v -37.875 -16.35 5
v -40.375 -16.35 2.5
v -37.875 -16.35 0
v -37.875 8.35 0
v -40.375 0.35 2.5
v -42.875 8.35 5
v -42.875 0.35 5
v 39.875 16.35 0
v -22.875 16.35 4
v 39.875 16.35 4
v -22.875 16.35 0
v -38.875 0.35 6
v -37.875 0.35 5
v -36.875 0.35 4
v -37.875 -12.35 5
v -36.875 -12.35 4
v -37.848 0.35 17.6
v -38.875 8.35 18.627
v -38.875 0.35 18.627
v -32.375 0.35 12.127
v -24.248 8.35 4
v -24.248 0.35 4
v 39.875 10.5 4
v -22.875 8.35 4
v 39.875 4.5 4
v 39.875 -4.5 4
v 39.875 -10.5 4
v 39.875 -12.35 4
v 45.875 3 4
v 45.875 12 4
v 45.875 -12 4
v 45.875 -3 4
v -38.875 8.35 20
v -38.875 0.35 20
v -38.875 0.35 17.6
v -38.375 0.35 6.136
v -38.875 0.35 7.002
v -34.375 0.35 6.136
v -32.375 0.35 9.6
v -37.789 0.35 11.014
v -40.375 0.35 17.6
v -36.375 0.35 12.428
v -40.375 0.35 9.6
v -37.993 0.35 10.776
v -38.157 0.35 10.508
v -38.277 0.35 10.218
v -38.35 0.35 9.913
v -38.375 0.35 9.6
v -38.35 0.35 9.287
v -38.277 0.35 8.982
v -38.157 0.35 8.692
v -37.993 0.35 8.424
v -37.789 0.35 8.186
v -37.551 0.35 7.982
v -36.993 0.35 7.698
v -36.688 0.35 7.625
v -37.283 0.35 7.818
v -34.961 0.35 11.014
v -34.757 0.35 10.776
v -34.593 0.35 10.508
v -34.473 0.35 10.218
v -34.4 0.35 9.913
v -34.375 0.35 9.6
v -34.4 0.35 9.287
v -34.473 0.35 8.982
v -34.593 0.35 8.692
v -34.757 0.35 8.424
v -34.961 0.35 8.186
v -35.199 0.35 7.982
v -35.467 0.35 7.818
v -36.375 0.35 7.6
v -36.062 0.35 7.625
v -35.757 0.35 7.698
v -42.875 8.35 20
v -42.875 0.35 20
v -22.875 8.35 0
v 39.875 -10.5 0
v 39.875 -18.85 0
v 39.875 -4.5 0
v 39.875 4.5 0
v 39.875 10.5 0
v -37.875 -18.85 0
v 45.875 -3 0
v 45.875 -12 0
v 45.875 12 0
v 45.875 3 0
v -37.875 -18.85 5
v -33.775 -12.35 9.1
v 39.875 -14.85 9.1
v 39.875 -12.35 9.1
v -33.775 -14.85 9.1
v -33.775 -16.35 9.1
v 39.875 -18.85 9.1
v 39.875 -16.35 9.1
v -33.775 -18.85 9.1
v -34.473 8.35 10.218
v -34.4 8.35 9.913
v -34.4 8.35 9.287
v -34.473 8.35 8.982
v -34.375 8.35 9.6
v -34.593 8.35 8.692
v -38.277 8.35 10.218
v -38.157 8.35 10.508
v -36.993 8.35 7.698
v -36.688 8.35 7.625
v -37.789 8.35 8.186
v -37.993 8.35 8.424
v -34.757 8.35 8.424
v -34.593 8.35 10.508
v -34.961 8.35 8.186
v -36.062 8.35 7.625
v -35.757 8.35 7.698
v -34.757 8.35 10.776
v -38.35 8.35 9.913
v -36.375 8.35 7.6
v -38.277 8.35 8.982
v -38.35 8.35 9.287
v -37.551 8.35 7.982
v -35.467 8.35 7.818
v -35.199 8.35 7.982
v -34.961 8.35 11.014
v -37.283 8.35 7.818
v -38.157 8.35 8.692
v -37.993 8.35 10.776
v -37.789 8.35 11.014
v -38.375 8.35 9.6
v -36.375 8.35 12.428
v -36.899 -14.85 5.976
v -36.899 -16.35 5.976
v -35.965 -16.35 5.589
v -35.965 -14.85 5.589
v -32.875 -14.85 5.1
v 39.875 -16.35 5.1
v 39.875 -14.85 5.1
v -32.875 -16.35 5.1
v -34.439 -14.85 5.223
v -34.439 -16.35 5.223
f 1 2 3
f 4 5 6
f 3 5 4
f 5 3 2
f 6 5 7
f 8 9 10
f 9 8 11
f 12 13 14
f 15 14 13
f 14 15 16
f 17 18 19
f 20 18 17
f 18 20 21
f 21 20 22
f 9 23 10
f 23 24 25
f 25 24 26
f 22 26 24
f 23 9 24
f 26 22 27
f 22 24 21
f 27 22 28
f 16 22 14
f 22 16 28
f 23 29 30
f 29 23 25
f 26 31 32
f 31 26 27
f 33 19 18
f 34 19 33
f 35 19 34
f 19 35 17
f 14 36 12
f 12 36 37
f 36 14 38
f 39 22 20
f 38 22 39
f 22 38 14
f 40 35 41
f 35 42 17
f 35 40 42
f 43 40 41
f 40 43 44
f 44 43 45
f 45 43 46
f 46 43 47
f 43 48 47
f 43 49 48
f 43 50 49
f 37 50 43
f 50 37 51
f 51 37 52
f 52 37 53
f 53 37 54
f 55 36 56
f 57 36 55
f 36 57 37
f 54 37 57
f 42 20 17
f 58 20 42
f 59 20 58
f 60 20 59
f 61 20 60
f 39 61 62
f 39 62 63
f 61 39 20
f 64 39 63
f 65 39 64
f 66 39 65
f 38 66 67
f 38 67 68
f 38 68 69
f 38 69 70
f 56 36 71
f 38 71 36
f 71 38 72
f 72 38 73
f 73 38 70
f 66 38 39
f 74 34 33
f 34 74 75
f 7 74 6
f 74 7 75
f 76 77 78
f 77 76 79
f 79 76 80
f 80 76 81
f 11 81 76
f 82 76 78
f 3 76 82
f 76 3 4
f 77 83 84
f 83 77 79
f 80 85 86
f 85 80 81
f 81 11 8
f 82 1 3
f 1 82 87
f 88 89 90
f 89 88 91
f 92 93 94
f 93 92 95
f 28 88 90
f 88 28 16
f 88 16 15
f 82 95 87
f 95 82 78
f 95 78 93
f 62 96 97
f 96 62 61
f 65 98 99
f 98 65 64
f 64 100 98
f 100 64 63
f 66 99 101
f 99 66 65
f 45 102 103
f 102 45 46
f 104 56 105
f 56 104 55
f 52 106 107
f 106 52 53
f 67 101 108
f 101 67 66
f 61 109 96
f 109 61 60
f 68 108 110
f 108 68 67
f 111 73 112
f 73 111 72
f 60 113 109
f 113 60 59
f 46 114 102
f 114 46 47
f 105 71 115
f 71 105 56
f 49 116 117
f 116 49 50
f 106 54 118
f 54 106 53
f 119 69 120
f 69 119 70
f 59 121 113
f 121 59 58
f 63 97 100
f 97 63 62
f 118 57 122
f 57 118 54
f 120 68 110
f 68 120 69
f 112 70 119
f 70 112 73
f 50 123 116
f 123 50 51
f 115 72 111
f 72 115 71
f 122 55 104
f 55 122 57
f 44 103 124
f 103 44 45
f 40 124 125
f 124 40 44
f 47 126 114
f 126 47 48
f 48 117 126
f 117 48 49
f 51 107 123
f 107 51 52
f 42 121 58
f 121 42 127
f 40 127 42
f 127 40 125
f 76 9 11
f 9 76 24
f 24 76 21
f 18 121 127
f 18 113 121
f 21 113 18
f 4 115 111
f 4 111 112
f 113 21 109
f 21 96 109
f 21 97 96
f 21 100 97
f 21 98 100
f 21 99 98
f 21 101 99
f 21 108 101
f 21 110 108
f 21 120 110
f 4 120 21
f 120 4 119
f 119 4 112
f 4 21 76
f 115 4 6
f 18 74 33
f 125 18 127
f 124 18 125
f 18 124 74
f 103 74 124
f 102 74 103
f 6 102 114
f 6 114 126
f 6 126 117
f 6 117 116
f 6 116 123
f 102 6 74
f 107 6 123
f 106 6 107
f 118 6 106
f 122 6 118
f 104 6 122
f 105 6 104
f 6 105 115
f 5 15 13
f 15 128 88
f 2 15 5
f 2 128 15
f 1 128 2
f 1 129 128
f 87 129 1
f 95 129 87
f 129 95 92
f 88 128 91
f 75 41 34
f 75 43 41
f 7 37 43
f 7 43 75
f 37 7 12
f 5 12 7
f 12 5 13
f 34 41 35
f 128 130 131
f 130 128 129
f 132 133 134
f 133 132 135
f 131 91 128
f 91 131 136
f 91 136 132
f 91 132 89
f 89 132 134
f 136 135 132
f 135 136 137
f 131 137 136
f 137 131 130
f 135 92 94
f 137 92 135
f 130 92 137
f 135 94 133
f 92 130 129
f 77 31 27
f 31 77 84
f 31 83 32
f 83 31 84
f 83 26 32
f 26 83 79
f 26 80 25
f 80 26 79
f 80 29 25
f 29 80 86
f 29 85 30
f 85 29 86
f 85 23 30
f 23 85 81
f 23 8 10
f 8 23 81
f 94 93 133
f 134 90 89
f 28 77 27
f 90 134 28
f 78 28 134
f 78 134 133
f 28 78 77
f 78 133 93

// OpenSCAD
// file: _ittybox.scad
include <_constants.scad>

module panel(wall_thickness, side=false) {
	bolt_x = side ? bolt_offset_y : bolt_offset_x;
	bolt_z = side ? bolt_offset_x : bolt_offset_y;
	width = side ? panel_depth : panel_width;
	overlap_cutout_potition = side ? end_corner_height : -end_corner_height;
	overlap_cutout_size = side ? end_corner_height*2 : end_corner_height;

	difference() {
		union() {
			// Main panel
			translate([0, 0, wall_thickness/2]) {
				cube([width - corner_radius*2, height, wall_thickness], center=true);
			}

			for (x = [-1, 1]) {
				// Rounded corner
				translate([x*(width/2 - corner_radius), 0, corner_radius]) {
					r = corner_radius;
					rotate([90, 0, 0]) {
						intersection() {
							cylinder(height, r=r, center=true, $fn=4);
							mirror([x > 0 ? 1 : 0, 0, 0]) translate([0, 0, -height/2]) {
								linear_extrude(height=height) polygon([[-r, r], [-r, -r], [r, -r]]);
							}
						}
					}
				}
				overlap_length = corner_overlap - corner_radius;

				// Overlap side
				translate([x*(width/2 - wall_thickness/2), 0, corner_radius + overlap_length/2]) {
					cube([wall_thickness, height, overlap_length], center=true);
				}

				// Corner chamfer
				translate([x*(width/2), height/2 - end_corner_height*2, 0]) {
					mirror([x > 0 ? 1 : 0, 0, 0])
					intersection() {
						rotate([0, 45, 0]) cube([corner_chamfer*2, height*2, corner_chamfer*2], center=true);
						translate([wall_thickness, 0, wall_thickness]) {
							cube([width/2, end_corner_height*2, corner_overlap - wall_thickness], center=false);
						}
					}
				}
			}

			if (side) {
				// Plexi support
				support_height = (panel_width - plexi_width)/2 + 4;
				support_depth = plexi_thickness + 5;
				translate([0, -height/2 + plexi_thickness/2, support_height/2]) {
					cube([width - corner_radius*2, support_depth, support_height], center=true);
				}
			}
		}

		for (x = [-1, 1]) {
			// Bolt hole
			translate([x*(width/2 - bolt_x), height/2 - end_corner_height*2, bolt_z]) {
				rotate([-90, 0, 0]) cylinder(height, d=bolt_diameter, center=false);
				rotate([0, -45, 0]) cube([bolt_diameter/2, height, bolt_diameter/2], center=false);
				bolt_depression = bolt_nut_thickness/2;
				rotate([90, 0, 0]) cylinder(bolt_nut_clearance, d=bolt_nut_width, center=false, $fn=6);
				mirror([0, 1, 0]) translate([-bolt_nut_width/2, 0, 0]) cube([bolt_nut_width, bolt_nut_clearance, bolt_nut_width], center=false);
			}

			// Overlap cutout
			translate([x*(width/2), height/2 + overlap_cutout_potition - overlap_cutout_size/2, 0]) {
				cube([corner_overlap*2, overlap_cutout_size, corner_overlap*4], center=true);
			}

			// Diagonal corner cut
			translate([x*(width/2), height/2 - end_corner_height*2, 0]) {
				mirror([0, 1, 0]) rotate([0, -45, 0]) cube([width, height, width], center=false);
			}
		}
	}
}

module plexi_hole() {
	hull() {
		translate([
			-plexi_width/2 + plexi_hole_offset_x + plexi_hole_diameter/2,
			-plexi_depth/2 + plexi_hole_offset_y + plexi_hole_diameter/2,
			0,
		]) {
			cylinder(plexi_thickness*2, d=plexi_hole_diameter, center=true);
			translate([0, plexi_hole_length - plexi_hole_diameter, 0]) cylinder(plexi_thickness*2, d=plexi_hole_diameter, center=true);
		}
	}
}

module plexi() {
	difference() {
		translate([0, 0, plexi_thickness/2]) {
			minkowski() {
				cube([
					plexi_width - plexi_corner_radius*2,
					plexi_depth - plexi_corner_radius*2,
					plexi_thickness/2,
				], center=true);
				cylinder(plexi_thickness/2, r=plexi_corner_radius, center=true);
			}
		}
		// plexi_hole();
		// mirror([0, 1, 0]) plexi_hole();
		// mirror([1, 0, 0]) plexi_hole();
		// rotate([0, 0, 180]) plexi_hole();
	}
}

module end_panel(wall_thickness) {
	difference() {
		panel(wall_thickness, side=false);
		translate([0, -height/2, panel_depth/2]) rotate([-90, 0, 0]) plexi();
	}
}

module side_panel(wall_thickness) {
	difference() {
		panel(wall_thickness, side=true);
		translate([0, -height/2, panel_width/2]) rotate([-90, 90, 0]) plexi();
	}
}

module button_hole() {
	cylinder(button_panel_thickness*3, d=button_diameter, center=true);
	translate([0, 0, button_panel_thickness])
		cylinder(button_panel_thickness*2, d=button_tab_diameter, center=false);
}

module back_panel() {
	wall_thickness = 6;
	difference() {
		end_panel(wall_thickness);

		// USB port panel
		translate([0, height/2 - usb_panel_board_pos_y, 0]) {
			cube([usb_panel_width, usb_panel_board_thickness, wall_thickness*3], center=true);
		}
		translate([0, height/2 - usb_panel_height/2, 0]) {
			cube([usb_panel_inner_width, usb_panel_inner_height, wall_thickness*3], center=true);
			screw_x = usb_panel_width/2 - usb_panel_hole_offset;
			screw_y = usb_panel_height/2 - usb_panel_hole_offset;
			for (xy = [ [screw_x, screw_y], [-screw_x, -screw_y] ]) {
				translate([each xy, 0]) {
					cylinder(wall_thickness*3, d=usb_panel_hole_diameter, center=true);
				}
			}
		}

		// Button holes
		translate([0, height/2 - usb_panel_height/2, 0]) {
			offset = usb_panel_width/2;
			for (x = [
				-(offset + button_spacing*2),
				-(offset + button_spacing),
				(offset + button_spacing),
				(offset + button_spacing*2),
			]) {
				translate([x, 0, 0]) {
					button_hole();
				}
			}
		}
	}
}

module front_panel() {
	end_panel(4);
}

module left_panel() {
	side_panel(4);
}

module right_panel() {
	wall_thickness = 4;
	switch_offset_x = panel_depth - 43;
	switch_offset_y = 8;
	difference() {
		side_panel(wall_thickness);
		translate([-panel_depth/2 + switch_offset_x, height/2 - switch_offset_y, 0]) {
			cube([12, 10, wall_thickness*3], center=true);
		}
	}
}

module panel_joint() {
	joint_inner = 6;
	joint_outer = 9;
	joint_length = 6;
	spacing = (joint_inner + joint_outer)/2;
	translate([-joint_length/2, 0, -corner_overlap])
	linear_extrude(height=corner_overlap*3)
	polygon([
		[0, height],
		[-panel_width, height],
		[-panel_width, -height],
		[0, -height],
		[0, -spacing - joint_inner/2],
		[joint_length, -spacing - joint_outer/2],
		[joint_length, -spacing + joint_outer/2],
		[0, -spacing + joint_inner/2],
		[0, spacing - joint_inner/2],
		[joint_length, spacing - joint_outer/2],
		[joint_length, spacing + joint_outer/2],
		[0, spacing + joint_inner/2],
	]);
}

module panel_split() {
  translate([0, -height, -corner_overlap*2])
  mirror([1, 0, 0])
  cube([panel_width, height*2, corner_overlap*4]);
}

back_panel();
translate([0, height*1.5, 0]) front_panel();
translate([0, height*-1.5, 0]) right_panel();
translate([0, height*-3, 0]) left_panel();
// file: _constants.scad
$fn = 40;

// AllFightSticks 9.5" Button Panel - Stickless
// https://allfightsticks.com/collections/9-5-enclosures/products/9-5-button-panel?variant=21327143141455
panel_width = 228.2;
panel_depth = 171.5;
bolt_offset_x = 9.6; // distance to center of hole
bolt_offset_y = 6.5; // distance to center of hole
corner_radius = 5;

// FocusAttack Blank Plexi Cover for AllFightSticks 9.5" Solid Bottom Panel
// https://focusattack.com/blank-plexi-cover-for-allfightsticks-9-5-solid-bottom-panel/
plexi_width = 218;
plexi_depth = panel_depth;
plexi_thickness = 1.5;
plexi_hole_offset_x = 11.1; // distance to edge
plexi_hole_offset_y = 8.85; // distance to edge
plexi_hole_diameter = 8;
plexi_hole_length = 14;
plexi_corner_radius = 10;

// Sanwa SDM-18 buttons
// https://paradisearcadeshop.com/home/controls/buttons/sanwa/358-sanwa-sdm-series
button_diameter = 18;
button_tab_diameter = 24;
button_panel_thickness = 3;

// Brook Wireless Fighting Board
// https://www.brookaccessory.com/detail/41130595/
usb_panel_width = 26;
usb_panel_height = 31.2;
usb_panel_depth = 1.6;
usb_panel_hole_offset = 3.5; // from top/side edge
usb_panel_hole_diameter = 3; // M3
usb_panel_board_thickness = 1.65; // horizontal board
usb_panel_board_pos_y = 17.6; // from top
usb_panel_inner_width = 12; // USB connector housing
usb_panel_inner_height = 20; // USB connector housing/3.5mm jack

// M4 x 20mm internal hex button-head screw
bolt_diameter = 4;
bolt_length = 20;
bolt_nut_thickness = 3.2;
bolt_nut_width = 8; // outer
bolt_nut_clearance = 10;

height = usb_panel_height + plexi_thickness;
corner_overlap = 20;
end_corner_height = 8;
corner_chamfer = 16;
button_spacing = button_tab_diameter*1.2;
joint_offset = 0.5; // Accounts for extra length added by joint
// main file
include <_constants.scad>
use <_ittybox.scad>;

translate([panel_depth/4, 0, 0])
intersection() {
  right_panel();
  panel_joint();
}
